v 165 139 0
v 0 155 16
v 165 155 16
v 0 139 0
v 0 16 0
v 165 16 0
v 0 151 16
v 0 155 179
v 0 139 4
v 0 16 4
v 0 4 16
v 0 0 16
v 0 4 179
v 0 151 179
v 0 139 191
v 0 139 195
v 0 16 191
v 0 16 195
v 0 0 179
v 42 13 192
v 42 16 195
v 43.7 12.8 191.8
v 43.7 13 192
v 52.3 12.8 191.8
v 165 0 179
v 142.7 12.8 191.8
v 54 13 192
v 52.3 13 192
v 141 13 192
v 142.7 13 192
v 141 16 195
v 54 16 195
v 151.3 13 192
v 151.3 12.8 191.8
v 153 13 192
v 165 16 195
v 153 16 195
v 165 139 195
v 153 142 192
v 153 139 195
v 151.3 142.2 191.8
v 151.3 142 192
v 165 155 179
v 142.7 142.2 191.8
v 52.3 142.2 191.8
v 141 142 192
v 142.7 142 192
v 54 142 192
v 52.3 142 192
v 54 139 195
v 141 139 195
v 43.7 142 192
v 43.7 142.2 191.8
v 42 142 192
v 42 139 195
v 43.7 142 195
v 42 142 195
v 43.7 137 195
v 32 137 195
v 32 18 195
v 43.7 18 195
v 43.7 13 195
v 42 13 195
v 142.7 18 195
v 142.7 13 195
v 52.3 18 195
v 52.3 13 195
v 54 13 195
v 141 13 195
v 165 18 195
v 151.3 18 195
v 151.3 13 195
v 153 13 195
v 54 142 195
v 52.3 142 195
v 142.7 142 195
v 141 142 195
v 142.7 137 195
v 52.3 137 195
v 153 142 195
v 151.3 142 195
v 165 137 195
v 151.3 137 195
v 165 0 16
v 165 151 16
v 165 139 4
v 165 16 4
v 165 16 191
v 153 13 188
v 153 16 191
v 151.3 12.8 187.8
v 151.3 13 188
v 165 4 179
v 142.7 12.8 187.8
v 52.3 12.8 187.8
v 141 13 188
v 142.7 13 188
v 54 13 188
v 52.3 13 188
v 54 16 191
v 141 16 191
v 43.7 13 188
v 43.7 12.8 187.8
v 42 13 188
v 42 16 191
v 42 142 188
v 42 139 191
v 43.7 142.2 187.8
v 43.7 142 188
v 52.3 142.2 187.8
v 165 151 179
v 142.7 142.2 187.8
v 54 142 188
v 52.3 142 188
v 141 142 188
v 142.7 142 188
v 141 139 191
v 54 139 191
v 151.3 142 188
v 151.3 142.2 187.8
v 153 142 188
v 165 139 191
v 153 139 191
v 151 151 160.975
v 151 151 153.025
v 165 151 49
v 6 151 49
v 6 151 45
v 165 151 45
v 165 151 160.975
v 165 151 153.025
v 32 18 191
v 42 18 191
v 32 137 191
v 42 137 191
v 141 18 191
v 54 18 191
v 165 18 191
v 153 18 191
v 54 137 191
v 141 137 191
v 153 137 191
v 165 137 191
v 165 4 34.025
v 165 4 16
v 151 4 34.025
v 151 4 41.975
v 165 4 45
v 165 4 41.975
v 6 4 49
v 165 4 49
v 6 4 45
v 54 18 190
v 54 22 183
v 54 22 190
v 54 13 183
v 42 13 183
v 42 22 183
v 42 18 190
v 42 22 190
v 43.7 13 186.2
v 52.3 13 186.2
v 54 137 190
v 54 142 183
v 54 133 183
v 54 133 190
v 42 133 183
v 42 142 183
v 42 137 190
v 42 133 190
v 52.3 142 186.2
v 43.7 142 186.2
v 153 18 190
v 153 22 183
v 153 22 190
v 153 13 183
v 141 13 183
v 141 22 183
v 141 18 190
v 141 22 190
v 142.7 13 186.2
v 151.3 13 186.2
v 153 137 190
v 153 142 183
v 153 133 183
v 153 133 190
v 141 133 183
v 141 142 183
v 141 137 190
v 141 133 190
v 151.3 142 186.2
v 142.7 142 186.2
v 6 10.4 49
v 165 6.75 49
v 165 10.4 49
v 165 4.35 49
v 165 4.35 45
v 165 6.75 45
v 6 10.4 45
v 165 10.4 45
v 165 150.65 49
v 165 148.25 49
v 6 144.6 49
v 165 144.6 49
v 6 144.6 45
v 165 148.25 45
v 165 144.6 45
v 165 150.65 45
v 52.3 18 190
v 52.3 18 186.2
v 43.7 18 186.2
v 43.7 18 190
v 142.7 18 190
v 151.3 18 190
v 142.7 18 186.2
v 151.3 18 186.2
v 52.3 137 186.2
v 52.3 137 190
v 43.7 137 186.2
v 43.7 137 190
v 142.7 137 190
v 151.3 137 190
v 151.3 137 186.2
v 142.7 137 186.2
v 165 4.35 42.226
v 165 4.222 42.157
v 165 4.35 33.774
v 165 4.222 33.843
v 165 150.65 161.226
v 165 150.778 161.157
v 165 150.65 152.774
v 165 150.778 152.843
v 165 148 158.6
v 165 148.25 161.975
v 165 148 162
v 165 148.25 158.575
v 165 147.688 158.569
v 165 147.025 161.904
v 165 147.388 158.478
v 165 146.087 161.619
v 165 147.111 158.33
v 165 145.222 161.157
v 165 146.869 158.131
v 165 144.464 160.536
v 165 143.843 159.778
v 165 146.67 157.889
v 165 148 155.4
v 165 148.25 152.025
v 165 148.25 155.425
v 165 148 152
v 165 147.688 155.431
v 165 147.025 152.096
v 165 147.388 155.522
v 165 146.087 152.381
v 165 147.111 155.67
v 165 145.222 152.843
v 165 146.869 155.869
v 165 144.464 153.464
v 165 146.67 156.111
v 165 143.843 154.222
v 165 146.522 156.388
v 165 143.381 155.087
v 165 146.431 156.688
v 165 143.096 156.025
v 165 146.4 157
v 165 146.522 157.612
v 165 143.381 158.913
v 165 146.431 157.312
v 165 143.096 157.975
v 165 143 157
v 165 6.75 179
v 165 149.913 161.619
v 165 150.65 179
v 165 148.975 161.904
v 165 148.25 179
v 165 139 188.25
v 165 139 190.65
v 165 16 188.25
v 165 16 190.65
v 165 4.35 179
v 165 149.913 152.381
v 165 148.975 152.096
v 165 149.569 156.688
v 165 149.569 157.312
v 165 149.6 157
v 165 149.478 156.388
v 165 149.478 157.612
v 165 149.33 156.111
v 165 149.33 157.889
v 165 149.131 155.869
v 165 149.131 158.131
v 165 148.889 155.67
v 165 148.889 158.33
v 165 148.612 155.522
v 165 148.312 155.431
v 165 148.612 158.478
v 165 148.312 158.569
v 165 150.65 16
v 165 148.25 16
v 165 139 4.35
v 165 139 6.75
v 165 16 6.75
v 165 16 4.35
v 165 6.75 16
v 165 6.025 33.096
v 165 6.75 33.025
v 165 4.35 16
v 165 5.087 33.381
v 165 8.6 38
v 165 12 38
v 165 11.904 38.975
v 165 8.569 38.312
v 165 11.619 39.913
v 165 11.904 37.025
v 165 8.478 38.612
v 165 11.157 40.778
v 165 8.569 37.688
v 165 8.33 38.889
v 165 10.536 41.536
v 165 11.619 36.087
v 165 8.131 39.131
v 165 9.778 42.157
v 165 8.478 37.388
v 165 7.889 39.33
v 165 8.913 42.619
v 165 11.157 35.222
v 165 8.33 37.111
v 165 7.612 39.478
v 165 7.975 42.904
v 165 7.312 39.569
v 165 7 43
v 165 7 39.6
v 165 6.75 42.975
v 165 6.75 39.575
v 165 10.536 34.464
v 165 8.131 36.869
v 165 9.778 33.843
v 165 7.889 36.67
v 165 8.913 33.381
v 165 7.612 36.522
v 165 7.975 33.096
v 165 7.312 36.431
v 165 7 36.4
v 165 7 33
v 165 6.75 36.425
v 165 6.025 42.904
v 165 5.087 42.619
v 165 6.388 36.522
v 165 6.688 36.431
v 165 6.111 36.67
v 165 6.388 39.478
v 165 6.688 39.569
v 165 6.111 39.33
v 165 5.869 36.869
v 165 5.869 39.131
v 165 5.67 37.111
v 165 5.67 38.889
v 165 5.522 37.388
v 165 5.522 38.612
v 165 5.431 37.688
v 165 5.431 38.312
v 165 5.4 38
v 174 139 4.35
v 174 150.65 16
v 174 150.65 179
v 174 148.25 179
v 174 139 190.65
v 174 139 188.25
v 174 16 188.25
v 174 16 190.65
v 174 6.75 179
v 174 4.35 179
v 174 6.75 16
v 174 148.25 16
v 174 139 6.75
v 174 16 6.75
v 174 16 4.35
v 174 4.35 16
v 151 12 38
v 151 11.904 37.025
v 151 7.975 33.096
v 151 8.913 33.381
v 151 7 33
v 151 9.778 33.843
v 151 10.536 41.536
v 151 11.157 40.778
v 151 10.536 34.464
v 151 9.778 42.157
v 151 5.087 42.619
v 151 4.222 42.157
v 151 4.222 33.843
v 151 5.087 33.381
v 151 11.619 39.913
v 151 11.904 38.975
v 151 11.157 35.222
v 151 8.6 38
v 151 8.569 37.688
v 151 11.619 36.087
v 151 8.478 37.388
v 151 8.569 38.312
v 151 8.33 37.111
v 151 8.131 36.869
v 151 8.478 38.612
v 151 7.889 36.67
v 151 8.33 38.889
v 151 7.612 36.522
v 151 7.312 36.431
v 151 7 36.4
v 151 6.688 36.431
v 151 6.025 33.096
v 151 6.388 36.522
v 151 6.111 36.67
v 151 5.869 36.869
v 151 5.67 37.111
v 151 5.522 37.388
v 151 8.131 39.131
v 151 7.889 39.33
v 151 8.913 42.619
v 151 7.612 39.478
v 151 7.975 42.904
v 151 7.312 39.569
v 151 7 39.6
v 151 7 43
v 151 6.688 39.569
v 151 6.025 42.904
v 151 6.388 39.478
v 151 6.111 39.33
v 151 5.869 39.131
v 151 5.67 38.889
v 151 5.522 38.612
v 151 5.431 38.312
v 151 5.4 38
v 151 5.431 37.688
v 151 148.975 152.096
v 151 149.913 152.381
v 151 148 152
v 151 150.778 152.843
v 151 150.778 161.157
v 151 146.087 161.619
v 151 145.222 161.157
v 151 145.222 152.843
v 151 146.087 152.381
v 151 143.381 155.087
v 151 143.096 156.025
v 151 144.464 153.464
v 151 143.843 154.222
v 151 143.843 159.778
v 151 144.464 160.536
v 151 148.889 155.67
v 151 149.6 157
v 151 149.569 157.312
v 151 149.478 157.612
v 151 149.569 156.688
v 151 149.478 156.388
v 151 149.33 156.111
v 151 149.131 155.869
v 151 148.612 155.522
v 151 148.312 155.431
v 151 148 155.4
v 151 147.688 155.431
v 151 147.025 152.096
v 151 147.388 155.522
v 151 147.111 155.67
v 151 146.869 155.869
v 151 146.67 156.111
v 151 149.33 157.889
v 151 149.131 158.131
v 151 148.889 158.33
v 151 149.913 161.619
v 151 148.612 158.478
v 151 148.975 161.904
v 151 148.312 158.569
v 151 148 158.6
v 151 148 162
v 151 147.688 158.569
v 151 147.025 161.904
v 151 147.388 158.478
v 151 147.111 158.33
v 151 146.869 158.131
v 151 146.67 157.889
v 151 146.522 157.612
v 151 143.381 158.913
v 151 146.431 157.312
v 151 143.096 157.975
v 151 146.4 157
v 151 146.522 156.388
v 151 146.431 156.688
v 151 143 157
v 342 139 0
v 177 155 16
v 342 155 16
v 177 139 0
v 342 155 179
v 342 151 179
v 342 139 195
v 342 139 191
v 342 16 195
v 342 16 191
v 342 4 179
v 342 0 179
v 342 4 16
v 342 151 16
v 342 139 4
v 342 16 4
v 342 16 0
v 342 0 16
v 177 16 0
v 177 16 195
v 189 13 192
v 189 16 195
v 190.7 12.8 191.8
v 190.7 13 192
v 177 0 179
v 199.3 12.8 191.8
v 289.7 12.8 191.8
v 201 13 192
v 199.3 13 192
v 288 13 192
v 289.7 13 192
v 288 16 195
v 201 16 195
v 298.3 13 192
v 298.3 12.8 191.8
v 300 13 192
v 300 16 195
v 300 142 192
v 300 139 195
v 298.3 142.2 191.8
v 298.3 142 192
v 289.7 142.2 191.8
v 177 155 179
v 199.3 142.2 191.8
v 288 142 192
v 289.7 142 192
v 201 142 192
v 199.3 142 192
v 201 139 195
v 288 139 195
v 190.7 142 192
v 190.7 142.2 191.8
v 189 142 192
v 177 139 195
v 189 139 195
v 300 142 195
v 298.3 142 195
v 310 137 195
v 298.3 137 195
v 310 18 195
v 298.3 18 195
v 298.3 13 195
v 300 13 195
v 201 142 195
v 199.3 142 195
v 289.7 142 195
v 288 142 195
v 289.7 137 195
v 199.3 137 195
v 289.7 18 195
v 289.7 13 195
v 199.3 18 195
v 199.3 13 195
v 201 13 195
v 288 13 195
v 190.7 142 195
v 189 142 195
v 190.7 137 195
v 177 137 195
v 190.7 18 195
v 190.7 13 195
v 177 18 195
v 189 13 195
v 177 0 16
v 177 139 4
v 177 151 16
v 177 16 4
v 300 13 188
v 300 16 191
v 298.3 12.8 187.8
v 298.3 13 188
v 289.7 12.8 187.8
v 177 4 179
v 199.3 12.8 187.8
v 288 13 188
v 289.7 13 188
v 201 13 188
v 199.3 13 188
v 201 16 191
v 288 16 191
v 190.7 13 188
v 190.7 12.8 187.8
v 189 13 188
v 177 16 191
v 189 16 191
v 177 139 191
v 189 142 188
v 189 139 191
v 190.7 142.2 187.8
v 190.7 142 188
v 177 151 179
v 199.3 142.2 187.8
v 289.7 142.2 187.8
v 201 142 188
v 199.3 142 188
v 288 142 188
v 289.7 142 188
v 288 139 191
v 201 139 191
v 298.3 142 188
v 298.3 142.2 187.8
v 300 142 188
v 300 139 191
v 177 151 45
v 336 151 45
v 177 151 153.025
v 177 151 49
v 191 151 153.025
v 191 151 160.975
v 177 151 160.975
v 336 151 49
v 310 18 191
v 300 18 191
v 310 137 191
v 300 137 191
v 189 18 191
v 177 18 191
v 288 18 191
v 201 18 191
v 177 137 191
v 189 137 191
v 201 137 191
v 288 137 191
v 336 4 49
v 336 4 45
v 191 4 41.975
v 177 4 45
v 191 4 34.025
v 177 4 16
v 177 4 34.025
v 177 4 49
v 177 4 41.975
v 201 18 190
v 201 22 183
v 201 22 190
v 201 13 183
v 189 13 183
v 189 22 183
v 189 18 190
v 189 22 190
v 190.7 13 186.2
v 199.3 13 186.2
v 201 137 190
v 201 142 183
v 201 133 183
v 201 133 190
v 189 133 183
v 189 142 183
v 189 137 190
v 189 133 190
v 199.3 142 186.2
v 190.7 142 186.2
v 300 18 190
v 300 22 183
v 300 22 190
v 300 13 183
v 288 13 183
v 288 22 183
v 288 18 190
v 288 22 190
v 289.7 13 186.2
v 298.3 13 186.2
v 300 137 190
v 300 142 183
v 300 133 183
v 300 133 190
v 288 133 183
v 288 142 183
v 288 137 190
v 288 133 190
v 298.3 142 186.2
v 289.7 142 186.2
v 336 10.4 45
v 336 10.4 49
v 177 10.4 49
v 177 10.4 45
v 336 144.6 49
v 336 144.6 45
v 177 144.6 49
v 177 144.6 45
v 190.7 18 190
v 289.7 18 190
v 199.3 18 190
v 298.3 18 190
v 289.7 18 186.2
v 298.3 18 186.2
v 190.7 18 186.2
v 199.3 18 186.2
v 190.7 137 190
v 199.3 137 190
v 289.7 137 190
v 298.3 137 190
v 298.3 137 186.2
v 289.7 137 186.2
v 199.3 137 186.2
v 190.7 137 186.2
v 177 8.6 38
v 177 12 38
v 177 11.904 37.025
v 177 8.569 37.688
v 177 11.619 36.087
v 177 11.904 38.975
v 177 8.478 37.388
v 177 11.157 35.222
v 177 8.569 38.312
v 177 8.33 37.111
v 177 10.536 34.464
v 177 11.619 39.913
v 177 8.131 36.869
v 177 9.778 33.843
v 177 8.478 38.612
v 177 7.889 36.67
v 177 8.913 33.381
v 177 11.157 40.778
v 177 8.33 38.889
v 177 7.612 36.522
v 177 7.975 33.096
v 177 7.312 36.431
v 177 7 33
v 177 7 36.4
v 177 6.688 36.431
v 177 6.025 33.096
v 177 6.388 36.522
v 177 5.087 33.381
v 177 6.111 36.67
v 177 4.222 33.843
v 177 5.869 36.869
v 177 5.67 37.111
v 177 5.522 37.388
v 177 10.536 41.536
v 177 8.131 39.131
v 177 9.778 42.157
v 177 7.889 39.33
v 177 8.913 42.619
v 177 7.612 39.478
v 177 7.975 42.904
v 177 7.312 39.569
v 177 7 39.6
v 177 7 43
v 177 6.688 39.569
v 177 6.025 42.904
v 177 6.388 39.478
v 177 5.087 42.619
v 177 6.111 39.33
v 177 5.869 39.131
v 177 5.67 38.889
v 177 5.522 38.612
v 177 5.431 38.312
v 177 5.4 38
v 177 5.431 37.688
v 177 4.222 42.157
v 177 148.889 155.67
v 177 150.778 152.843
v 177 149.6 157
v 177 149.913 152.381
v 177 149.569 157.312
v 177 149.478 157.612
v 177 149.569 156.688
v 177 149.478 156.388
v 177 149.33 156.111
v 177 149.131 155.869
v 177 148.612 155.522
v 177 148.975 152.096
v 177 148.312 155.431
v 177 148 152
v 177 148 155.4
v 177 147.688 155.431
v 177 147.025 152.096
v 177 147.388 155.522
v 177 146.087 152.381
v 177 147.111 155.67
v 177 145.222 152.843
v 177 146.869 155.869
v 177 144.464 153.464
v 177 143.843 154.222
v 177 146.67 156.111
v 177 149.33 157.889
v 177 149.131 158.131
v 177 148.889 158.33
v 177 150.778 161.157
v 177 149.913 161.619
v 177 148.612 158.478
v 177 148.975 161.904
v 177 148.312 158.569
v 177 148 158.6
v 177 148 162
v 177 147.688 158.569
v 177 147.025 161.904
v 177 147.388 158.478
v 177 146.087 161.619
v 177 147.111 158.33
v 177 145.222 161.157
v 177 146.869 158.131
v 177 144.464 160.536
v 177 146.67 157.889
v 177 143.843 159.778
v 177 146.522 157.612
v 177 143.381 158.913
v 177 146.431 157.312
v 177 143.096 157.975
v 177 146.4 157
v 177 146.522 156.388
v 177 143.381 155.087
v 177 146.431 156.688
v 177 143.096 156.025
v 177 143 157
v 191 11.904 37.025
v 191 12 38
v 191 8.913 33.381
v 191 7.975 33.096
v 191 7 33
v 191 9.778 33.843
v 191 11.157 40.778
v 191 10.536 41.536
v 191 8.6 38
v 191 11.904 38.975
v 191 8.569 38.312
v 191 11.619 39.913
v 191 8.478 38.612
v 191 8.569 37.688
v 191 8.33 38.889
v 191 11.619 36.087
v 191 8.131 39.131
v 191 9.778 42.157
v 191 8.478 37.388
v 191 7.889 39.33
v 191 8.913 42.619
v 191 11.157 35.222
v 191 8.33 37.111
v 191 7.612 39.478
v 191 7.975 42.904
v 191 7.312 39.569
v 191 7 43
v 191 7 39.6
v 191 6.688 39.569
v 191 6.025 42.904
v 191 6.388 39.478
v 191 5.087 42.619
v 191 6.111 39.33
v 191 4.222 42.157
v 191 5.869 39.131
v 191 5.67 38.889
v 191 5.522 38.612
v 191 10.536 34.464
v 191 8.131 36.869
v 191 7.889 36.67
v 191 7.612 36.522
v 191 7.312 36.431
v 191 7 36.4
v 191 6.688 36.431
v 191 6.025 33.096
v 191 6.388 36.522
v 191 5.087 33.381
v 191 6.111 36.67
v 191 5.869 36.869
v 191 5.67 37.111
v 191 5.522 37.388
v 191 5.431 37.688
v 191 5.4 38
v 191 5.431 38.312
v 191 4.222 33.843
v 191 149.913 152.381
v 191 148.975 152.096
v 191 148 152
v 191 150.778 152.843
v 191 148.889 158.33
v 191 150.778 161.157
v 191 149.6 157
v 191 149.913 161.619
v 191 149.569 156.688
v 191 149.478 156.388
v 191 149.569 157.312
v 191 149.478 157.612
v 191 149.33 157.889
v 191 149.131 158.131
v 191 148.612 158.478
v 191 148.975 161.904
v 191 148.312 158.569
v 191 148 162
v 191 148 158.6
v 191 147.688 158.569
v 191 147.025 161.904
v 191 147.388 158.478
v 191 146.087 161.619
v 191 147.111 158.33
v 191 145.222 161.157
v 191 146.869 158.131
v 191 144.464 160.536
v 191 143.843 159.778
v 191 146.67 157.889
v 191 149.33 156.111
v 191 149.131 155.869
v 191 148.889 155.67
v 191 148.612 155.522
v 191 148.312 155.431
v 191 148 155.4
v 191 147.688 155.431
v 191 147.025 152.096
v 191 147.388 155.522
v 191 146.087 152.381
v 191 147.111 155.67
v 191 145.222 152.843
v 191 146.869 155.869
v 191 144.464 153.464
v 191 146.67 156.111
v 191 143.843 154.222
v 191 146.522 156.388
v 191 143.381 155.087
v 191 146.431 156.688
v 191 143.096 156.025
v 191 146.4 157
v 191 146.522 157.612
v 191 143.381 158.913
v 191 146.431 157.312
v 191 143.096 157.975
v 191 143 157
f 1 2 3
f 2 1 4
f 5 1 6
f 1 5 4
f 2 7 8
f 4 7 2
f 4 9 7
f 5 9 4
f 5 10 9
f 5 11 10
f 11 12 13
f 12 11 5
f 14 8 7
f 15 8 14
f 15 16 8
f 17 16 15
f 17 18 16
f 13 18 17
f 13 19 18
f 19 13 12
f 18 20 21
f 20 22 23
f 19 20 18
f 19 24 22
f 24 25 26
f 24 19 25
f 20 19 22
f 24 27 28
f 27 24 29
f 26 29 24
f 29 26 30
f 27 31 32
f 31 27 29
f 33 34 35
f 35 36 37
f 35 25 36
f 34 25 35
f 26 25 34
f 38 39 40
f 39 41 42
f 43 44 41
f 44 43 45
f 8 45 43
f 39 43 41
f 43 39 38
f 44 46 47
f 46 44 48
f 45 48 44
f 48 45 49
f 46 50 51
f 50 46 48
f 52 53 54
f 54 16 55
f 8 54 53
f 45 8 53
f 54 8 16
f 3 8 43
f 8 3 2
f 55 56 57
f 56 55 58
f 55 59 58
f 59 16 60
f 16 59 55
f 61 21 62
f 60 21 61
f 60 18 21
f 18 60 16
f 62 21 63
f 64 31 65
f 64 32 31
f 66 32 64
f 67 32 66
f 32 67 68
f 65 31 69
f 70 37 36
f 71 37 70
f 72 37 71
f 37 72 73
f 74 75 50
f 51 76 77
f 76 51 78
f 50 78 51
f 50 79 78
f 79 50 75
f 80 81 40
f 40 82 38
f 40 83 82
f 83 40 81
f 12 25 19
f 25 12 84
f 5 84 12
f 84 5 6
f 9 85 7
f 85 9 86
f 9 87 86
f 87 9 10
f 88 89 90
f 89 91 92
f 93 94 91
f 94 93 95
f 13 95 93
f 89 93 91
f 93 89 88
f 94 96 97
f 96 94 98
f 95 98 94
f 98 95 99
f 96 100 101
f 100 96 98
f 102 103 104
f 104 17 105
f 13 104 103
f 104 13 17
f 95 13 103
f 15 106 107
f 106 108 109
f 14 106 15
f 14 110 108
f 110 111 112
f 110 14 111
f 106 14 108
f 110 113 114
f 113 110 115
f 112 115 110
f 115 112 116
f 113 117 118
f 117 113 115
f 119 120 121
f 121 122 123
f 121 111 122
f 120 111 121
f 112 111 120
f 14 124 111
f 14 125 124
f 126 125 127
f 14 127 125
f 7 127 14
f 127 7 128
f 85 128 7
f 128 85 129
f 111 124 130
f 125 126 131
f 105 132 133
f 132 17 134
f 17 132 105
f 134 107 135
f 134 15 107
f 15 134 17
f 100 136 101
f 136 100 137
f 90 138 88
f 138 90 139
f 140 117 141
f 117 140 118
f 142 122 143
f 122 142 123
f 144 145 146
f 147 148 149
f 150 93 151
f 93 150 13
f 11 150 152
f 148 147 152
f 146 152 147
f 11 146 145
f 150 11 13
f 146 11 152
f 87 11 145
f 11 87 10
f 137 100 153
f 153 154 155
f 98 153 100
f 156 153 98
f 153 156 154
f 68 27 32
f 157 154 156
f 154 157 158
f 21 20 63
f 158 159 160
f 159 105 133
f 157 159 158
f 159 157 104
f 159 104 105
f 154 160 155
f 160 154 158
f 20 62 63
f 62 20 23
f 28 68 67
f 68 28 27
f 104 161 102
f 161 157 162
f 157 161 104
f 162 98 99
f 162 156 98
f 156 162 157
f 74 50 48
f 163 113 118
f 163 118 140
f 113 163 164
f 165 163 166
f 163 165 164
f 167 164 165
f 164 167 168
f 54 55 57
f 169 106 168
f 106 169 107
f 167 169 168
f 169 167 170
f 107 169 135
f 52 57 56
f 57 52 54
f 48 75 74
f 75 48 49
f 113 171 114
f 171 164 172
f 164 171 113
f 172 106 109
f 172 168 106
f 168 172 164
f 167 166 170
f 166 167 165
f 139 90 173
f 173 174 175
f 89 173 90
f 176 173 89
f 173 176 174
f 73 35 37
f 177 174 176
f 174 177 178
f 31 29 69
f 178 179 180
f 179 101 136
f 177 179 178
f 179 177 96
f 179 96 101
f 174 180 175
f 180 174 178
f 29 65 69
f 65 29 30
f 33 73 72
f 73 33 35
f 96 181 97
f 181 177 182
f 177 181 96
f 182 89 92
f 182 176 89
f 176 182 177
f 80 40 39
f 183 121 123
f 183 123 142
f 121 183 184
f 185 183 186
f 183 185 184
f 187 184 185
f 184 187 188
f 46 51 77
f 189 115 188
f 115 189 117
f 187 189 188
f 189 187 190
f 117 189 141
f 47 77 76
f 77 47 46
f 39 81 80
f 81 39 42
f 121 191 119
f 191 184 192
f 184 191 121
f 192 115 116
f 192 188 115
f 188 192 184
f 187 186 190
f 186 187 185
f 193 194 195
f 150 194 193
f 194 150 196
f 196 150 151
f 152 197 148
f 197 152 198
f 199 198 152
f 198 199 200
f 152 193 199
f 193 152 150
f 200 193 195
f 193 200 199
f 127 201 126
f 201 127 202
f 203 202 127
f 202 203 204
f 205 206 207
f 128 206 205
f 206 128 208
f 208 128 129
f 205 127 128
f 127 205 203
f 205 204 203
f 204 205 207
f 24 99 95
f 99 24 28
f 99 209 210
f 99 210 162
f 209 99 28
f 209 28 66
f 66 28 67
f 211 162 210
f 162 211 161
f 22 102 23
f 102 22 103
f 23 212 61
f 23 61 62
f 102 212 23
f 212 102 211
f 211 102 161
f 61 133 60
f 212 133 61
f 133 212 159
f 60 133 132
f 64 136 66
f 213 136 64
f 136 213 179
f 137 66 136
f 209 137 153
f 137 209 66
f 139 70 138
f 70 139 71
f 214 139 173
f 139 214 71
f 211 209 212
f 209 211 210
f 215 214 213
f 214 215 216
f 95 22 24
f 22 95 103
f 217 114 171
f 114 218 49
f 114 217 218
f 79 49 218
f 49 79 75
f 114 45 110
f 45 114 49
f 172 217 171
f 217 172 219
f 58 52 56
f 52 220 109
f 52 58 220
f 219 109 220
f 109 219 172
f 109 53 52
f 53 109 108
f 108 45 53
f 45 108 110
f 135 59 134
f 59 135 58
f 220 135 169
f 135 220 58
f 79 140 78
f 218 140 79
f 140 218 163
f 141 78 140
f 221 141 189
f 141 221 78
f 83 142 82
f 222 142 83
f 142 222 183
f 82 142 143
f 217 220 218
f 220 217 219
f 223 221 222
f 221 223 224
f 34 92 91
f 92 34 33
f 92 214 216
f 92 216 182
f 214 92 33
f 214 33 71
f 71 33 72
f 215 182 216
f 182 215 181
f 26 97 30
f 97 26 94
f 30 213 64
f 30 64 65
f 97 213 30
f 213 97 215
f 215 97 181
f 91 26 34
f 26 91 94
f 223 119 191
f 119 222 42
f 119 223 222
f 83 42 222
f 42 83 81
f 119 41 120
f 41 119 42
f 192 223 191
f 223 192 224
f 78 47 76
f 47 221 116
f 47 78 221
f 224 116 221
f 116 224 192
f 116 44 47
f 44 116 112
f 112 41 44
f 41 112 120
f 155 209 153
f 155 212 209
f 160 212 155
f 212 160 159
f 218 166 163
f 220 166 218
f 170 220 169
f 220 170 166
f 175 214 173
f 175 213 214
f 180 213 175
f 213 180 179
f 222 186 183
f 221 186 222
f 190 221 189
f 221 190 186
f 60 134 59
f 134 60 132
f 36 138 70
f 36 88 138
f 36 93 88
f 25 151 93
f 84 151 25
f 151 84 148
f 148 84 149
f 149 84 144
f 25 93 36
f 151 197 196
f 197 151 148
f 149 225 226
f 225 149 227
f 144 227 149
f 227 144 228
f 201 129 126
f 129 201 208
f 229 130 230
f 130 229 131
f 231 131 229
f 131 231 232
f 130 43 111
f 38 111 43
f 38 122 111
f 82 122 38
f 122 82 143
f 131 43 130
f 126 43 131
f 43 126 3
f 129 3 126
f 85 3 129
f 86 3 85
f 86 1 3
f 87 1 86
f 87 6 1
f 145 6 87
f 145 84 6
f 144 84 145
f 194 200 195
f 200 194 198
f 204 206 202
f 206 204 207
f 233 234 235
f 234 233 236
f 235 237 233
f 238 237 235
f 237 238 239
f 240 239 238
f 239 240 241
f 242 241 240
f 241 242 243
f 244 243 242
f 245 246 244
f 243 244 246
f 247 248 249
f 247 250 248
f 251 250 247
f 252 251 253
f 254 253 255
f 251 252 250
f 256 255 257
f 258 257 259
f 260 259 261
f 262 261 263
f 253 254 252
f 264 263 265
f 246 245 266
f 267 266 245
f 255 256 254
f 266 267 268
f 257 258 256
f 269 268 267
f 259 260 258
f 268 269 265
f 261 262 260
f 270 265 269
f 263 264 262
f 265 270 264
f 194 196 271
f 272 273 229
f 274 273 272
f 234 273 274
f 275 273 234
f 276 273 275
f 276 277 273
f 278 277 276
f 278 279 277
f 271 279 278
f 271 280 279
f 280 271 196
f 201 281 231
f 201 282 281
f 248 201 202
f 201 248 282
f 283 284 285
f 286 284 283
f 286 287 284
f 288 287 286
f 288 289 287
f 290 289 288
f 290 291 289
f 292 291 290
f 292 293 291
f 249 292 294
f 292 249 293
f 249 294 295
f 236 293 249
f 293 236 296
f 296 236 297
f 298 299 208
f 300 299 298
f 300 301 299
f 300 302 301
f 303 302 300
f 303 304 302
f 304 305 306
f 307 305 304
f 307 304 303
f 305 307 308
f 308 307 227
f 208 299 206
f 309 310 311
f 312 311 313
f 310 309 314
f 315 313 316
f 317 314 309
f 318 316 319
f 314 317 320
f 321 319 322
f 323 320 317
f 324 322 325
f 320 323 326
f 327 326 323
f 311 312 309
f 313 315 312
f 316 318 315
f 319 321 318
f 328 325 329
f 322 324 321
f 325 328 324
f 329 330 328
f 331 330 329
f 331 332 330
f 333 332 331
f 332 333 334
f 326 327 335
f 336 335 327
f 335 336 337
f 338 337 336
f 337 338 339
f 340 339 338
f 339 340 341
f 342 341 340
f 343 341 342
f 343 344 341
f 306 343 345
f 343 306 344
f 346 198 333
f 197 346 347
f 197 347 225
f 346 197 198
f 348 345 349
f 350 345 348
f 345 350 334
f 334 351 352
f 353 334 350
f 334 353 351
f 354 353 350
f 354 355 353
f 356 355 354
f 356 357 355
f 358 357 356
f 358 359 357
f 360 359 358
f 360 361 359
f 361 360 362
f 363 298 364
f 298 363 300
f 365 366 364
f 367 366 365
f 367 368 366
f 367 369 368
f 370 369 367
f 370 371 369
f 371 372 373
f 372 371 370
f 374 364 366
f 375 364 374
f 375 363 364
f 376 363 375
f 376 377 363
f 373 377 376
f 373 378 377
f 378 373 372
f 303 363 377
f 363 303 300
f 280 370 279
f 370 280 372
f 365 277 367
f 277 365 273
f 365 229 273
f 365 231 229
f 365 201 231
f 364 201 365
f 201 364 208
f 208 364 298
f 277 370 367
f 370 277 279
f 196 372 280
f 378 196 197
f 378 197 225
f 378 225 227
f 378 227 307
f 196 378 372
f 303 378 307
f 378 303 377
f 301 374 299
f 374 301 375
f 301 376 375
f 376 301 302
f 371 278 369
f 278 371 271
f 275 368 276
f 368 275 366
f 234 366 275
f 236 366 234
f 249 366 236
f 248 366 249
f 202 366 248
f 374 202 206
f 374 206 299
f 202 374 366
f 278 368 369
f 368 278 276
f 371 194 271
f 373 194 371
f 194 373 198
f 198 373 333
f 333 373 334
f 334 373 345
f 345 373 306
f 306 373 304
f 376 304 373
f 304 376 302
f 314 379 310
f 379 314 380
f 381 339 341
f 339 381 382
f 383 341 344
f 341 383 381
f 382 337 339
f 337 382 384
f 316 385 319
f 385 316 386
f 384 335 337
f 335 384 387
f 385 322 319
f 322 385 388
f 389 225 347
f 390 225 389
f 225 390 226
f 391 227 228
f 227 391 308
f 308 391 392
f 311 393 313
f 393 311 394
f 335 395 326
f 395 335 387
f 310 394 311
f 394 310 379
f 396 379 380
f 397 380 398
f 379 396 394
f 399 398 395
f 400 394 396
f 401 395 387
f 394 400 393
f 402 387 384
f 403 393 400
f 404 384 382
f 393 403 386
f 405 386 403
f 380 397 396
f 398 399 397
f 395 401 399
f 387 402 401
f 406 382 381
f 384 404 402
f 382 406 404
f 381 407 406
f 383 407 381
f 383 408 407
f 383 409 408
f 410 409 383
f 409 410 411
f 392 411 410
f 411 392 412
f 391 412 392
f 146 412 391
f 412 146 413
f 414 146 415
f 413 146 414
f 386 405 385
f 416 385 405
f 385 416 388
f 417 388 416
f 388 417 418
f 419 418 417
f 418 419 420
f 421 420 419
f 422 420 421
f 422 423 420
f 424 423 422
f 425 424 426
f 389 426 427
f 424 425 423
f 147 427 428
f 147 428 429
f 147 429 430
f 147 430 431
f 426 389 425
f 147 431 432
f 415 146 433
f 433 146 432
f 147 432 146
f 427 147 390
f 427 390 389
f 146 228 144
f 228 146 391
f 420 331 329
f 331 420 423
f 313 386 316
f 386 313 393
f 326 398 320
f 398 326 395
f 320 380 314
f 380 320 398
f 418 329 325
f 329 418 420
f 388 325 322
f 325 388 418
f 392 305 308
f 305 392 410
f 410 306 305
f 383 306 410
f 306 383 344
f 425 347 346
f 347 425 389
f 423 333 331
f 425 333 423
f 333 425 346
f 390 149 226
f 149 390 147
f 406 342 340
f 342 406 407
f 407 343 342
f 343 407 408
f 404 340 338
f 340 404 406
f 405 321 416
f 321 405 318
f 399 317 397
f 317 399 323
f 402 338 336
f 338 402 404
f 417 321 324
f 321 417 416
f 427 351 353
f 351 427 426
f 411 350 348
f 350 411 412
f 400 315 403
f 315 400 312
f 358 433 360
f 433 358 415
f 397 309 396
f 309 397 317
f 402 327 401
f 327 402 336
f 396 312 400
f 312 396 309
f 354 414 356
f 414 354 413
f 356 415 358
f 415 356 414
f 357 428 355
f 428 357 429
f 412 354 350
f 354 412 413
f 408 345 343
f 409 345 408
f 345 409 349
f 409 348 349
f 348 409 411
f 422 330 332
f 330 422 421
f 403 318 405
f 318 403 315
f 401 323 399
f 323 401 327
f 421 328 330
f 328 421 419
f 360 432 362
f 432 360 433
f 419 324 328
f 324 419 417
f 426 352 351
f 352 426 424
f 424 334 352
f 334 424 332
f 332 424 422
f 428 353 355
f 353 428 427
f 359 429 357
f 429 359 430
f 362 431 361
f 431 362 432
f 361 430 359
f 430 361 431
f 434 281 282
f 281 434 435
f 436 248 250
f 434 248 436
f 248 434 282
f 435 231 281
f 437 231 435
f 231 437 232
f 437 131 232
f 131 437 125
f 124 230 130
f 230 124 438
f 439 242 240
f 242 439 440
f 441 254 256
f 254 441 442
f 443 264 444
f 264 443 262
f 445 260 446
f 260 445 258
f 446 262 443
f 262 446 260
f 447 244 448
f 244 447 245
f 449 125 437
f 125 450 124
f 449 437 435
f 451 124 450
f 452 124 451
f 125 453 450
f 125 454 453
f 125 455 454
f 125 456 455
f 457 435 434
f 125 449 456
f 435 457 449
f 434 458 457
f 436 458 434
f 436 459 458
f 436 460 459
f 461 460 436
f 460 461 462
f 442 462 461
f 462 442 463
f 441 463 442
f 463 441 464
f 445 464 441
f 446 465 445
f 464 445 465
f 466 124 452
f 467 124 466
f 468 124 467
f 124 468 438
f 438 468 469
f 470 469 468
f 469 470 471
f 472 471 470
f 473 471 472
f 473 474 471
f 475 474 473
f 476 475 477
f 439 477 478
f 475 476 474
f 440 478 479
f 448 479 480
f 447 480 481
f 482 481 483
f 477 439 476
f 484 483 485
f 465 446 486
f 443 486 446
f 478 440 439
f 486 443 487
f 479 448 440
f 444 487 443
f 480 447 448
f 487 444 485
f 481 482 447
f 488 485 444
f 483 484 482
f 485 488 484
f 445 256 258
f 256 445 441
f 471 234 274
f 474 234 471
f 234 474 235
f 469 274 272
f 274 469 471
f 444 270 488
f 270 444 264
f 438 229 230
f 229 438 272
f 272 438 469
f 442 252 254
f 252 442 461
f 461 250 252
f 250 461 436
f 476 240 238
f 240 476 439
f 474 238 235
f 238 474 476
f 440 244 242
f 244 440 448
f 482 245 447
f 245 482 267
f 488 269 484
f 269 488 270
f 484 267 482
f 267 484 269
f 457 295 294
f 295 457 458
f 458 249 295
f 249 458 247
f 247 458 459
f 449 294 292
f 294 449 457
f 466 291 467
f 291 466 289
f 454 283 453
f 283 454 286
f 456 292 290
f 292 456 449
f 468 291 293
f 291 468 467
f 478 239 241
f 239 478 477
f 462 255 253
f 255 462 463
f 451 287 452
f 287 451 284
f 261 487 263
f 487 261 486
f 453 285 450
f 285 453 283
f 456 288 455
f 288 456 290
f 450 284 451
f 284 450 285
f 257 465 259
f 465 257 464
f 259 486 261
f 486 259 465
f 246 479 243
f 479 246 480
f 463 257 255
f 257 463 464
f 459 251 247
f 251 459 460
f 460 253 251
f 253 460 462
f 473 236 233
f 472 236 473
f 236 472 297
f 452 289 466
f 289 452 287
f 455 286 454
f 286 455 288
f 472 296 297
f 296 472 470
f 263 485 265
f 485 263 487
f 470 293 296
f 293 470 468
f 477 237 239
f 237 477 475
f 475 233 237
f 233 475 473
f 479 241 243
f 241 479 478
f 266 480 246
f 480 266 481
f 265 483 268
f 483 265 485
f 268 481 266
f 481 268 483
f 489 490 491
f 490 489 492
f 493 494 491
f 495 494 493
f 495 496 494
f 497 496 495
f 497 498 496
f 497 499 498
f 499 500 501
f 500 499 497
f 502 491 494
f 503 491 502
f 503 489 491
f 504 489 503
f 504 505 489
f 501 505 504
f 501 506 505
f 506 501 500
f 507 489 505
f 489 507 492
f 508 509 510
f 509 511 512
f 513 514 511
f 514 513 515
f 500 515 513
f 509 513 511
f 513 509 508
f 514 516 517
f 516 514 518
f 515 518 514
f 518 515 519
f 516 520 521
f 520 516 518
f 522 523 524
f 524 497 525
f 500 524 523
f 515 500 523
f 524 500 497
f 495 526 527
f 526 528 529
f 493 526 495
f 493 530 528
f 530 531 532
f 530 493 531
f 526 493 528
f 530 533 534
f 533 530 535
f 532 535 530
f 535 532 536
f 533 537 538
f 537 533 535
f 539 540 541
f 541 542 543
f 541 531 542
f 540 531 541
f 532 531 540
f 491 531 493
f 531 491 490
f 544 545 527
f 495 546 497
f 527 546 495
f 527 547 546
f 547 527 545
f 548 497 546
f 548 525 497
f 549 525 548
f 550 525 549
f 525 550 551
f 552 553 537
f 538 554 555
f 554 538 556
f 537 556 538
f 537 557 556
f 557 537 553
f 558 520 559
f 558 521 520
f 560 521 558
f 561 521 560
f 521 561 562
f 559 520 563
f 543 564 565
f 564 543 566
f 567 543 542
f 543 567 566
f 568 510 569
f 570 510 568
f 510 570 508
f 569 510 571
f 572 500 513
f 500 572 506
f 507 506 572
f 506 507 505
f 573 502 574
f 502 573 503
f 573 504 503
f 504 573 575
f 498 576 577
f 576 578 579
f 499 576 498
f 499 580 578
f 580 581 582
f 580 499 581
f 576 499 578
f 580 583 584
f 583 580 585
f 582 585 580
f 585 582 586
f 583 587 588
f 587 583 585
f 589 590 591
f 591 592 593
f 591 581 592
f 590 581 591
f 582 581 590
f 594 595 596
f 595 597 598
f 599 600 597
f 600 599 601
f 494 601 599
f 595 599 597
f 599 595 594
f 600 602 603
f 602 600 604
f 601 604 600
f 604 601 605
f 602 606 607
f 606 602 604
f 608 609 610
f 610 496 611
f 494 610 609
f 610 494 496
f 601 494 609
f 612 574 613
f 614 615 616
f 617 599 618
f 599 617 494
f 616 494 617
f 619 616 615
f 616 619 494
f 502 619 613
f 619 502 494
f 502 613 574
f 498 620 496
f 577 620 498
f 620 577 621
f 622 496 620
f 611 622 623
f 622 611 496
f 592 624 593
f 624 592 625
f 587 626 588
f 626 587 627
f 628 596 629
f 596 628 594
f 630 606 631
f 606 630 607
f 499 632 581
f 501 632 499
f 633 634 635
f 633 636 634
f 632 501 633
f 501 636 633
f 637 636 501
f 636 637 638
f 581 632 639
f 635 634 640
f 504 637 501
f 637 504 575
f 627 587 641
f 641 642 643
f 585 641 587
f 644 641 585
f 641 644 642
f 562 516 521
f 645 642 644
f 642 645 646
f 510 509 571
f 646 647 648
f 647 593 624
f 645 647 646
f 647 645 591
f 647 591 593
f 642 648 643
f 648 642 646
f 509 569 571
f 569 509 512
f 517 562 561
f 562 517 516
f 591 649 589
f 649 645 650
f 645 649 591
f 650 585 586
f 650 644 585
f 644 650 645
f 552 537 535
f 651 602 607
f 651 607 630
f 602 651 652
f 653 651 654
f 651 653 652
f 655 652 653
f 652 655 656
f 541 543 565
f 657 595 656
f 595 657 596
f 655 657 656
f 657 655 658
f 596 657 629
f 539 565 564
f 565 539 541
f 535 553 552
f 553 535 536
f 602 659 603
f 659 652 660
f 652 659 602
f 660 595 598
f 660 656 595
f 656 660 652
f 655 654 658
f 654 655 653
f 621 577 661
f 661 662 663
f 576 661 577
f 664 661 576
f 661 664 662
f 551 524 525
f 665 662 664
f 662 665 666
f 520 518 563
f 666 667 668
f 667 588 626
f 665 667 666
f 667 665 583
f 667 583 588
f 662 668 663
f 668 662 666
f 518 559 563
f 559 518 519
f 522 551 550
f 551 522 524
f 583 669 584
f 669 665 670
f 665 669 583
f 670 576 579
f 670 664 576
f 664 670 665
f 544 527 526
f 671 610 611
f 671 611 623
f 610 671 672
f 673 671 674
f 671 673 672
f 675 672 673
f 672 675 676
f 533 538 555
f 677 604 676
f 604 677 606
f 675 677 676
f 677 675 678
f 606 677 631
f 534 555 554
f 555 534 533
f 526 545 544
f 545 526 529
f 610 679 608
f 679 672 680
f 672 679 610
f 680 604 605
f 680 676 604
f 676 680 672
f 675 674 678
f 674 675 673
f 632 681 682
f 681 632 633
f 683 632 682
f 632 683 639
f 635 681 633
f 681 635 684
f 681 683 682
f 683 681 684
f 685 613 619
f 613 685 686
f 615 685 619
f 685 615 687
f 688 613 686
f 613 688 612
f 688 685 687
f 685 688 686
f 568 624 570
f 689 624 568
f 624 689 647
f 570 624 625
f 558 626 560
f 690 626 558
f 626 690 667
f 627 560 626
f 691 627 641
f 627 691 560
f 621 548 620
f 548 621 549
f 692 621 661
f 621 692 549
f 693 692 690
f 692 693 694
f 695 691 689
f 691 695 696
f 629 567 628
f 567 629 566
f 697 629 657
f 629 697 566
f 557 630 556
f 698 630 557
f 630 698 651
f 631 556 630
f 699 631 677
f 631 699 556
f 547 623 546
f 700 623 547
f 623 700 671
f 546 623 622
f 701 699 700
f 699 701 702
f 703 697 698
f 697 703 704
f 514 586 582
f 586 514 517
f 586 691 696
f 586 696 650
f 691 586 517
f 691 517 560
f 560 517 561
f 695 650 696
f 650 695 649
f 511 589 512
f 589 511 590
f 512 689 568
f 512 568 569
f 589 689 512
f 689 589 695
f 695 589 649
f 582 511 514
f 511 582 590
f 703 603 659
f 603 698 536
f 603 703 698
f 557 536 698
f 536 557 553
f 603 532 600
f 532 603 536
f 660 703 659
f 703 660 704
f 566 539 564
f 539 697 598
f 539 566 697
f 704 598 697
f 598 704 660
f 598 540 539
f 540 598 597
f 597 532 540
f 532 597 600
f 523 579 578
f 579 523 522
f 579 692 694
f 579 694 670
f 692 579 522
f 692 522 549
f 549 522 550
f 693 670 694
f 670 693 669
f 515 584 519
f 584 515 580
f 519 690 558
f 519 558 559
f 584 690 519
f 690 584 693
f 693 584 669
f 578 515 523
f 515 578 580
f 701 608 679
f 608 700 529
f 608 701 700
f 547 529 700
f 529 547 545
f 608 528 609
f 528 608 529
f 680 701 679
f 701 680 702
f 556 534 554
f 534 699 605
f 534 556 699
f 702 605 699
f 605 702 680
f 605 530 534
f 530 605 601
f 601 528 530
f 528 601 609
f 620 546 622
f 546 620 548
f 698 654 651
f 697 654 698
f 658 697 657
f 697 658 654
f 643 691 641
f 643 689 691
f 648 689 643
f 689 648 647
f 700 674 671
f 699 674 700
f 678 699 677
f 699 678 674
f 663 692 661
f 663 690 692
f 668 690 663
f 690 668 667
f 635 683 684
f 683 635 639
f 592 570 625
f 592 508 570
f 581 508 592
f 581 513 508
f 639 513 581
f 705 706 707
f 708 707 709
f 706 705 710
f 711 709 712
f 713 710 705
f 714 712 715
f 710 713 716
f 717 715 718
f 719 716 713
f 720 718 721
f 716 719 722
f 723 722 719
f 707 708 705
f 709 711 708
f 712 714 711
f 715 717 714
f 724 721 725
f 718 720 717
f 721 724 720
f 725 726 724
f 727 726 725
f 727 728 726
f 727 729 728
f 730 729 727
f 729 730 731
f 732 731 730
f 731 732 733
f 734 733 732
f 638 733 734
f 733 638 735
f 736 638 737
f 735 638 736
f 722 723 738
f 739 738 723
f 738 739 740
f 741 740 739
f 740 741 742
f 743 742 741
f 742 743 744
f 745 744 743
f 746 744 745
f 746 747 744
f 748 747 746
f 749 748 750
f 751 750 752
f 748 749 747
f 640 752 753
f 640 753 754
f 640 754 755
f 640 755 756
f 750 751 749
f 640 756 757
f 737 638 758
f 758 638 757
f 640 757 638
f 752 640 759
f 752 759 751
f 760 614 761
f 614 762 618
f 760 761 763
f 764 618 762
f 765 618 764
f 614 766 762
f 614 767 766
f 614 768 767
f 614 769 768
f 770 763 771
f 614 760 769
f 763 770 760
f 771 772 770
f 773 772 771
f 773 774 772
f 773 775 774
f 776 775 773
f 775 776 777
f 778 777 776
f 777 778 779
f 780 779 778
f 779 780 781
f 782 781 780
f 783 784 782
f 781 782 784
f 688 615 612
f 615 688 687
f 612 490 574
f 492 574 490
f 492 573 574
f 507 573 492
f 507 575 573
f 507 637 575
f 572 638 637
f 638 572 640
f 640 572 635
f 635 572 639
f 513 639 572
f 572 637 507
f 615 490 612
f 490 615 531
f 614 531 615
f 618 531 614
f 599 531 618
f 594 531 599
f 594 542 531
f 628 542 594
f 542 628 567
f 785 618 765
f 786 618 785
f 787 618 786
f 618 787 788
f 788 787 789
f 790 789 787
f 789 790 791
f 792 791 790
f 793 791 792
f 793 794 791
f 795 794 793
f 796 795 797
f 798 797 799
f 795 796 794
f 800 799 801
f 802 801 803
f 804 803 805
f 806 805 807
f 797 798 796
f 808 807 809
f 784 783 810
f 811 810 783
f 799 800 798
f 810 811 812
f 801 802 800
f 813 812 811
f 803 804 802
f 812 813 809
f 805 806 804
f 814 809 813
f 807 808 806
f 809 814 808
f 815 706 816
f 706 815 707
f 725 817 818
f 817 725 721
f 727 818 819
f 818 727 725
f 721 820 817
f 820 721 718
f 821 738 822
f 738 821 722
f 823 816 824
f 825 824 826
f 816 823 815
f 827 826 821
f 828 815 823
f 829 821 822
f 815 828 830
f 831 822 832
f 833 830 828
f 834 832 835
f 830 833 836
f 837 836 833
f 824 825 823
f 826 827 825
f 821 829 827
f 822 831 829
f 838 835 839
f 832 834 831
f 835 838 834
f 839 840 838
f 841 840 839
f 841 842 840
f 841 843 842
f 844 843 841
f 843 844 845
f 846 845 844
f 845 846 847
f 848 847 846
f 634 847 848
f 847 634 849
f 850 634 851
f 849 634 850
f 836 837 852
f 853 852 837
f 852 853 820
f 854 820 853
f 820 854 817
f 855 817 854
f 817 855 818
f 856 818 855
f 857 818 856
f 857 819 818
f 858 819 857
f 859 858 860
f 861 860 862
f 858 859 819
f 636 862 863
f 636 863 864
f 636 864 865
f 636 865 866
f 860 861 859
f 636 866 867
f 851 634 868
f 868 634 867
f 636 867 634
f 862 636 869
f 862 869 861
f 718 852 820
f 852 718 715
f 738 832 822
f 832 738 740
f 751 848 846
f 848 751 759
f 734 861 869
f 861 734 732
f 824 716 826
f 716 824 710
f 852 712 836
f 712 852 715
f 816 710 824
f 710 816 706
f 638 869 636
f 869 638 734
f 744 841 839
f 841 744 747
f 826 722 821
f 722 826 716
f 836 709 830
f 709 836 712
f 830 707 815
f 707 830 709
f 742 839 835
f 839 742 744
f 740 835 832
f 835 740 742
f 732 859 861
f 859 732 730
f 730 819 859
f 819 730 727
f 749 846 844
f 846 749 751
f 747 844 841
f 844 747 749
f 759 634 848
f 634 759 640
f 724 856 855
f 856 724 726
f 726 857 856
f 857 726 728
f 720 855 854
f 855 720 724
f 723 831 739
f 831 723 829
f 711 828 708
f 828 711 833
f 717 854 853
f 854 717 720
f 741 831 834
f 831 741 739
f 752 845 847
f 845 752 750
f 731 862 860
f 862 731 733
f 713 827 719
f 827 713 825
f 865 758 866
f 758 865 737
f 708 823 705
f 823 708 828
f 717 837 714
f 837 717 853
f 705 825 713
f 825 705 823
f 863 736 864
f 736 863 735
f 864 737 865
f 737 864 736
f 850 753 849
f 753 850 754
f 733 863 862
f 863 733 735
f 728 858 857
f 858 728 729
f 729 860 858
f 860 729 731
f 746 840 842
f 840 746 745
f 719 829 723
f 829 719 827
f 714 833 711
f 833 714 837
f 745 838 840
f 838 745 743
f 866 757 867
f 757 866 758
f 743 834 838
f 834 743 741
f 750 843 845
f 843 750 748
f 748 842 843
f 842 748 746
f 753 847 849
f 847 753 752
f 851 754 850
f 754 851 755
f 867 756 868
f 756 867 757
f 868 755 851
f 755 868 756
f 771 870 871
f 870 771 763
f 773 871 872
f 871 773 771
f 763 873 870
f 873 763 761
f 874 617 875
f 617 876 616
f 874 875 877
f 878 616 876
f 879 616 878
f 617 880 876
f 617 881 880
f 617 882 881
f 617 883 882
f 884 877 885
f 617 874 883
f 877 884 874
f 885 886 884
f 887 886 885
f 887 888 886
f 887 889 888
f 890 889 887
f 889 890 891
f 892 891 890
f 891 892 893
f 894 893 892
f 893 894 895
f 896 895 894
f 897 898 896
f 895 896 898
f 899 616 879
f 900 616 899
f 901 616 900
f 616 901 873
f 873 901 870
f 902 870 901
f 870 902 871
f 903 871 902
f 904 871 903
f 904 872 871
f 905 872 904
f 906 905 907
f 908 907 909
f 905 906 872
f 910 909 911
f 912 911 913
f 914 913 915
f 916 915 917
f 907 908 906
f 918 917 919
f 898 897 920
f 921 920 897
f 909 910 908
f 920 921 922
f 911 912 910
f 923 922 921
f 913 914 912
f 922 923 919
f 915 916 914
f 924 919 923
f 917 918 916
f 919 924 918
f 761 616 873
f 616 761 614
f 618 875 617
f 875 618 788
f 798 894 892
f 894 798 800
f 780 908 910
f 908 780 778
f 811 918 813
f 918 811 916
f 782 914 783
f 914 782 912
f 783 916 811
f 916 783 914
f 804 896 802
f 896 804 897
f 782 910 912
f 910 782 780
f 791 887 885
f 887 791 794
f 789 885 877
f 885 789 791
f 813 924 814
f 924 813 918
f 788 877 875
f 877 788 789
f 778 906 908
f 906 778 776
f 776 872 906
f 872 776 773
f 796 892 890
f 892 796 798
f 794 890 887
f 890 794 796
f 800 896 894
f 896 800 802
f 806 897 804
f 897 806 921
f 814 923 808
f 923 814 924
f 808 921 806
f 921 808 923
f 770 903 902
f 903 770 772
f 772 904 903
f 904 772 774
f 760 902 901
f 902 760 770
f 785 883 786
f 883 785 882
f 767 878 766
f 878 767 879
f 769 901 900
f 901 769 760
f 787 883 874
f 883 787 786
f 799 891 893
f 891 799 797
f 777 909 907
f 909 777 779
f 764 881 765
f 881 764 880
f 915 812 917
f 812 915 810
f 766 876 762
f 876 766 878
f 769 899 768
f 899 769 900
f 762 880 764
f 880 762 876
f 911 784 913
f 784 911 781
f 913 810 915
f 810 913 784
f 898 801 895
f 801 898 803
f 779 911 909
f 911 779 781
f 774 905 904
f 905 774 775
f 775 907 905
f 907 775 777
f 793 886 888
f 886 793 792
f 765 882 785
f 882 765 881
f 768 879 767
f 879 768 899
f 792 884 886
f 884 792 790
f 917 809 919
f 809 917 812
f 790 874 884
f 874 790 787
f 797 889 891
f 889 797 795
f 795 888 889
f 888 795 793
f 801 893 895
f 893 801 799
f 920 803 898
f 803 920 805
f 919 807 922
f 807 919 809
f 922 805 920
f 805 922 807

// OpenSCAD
// file: lib/snap-interface.scad
// Hidden panel snap interface v0.1.
// Print and test the coupon before committing full panels to a printer.

snap_arm_width = 8;
snap_arm_thickness = 2.2;
snap_arm_drop = 8;
snap_barb_depth = 1.0;
snap_barb_height = 2.0;
snap_slot_clearance = 0.30;

module snap_hook() {
    // Panel underside is Z=0; hook extends downward.
    union() {
        translate([-snap_arm_width / 2, 0, -snap_arm_drop])
            cube([snap_arm_width, snap_arm_thickness, snap_arm_drop + 0.4]);
        hull() {
            translate([-snap_arm_width / 2, snap_arm_thickness, -snap_arm_drop])
                cube([snap_arm_width, 0.2, snap_barb_height]);
            translate([-snap_arm_width / 2, snap_arm_thickness + snap_barb_depth, -snap_arm_drop + snap_barb_height])
                cube([snap_arm_width, 0.2, 0.2]);
        }
    }
}

module snap_receiver_slot(depth = 8) {
    translate([
        -snap_arm_width / 2 - snap_slot_clearance,
        -0.1,
        -snap_arm_drop - snap_slot_clearance
    ])
        cube([
            snap_arm_width + 2 * snap_slot_clearance,
            depth + 0.2,
            snap_arm_drop + 2 * snap_slot_clearance
        ]);
}
// main file
// Split structural tunnel v0.1.
// Two printable shell sections with an internal alignment collar.
// External styling follows exterior-nyacom-v0.2.scad.
include <lib/snap-interface.scad>

$fn = 32;

part = "assembly"; // front | rear | assembly

body = [330, 155, 195];
chamfer = 16;
wall = 4;
split_x = 165;
collar_length = 9;
collar_clearance = 0.35; // per side; tune with material coupon
collar_wall = 2.4;
assembly_gap = 12;

intake_opening = [266, 119];
intake_origin = [32, 18];
panel_origin = [30, 12];
panel_half_length = 135;
receiver_x_local = [18, panel_half_length - 18];
receiver_y = [panel_origin[1] + 4, panel_origin[1] + 131 - 4];
receiver_block = [12, 9, 12];
tray_ledge_z = 45;
tray_ledge = [body[0] - 12, 7, 4];

module oct_prism_x(length, width, height, cut) {
    translate([0, 0, height])
        rotate([0, 90, 0])
            linear_extrude(height = length)
                polygon([
                    [cut, 0], [height - cut, 0], [height, cut],
                    [height, width - cut], [height - cut, width],
                    [cut, width], [0, width - cut], [0, cut]
                ]);
}

module full_open_shell() {
    difference() {
        oct_prism_x(body[0], body[1], body[2], chamfer);
        translate([-1, wall, wall])
            oct_prism_x(body[0] + 2, body[1] - 2 * wall, body[2] - 2 * wall, chamfer - wall);
    }
}

module receiver_blocks() {
    for (half_x = [panel_origin[0], panel_origin[0] + panel_half_length],
         local_x = receiver_x_local,
         y = receiver_y)
        translate([
            half_x + local_x - receiver_block[0] / 2,
            y < body[1] / 2 ? 13 : body[1] - 13 - receiver_block[1],
            body[2] - receiver_block[2]
        ]) cube(receiver_block);
}

module tray_ledges() {
    // Continuous ledges carry the tray; screw locations can be drilled into
    // elongated tray slots after the physical fit check.
    translate([6, 3.4, tray_ledge_z]) cube(tray_ledge);
    translate([6, body[1] - 3.4 - tray_ledge[1], tray_ledge_z]) cube(tray_ledge);
}

module snap_receiver_cutouts() {
    for (half_x = [panel_origin[0], panel_origin[0] + panel_half_length],
         local_x = receiver_x_local,
         y = receiver_y)
        translate([
            half_x + local_x - snap_arm_width / 2 - snap_slot_clearance,
            y < body[1] / 2 ? 12.8 : body[1] - 12.8 - 5.2,
            body[2] - snap_arm_drop - snap_slot_clearance - 0.5
        ]) cube([
            snap_arm_width + 2 * snap_slot_clearance,
            5.2,
            snap_arm_drop + snap_slot_clearance + 1
        ]);
}

module functional_shell() {
    difference() {
        union() {
            full_open_shell();
            receiver_blocks();
            tray_ledges();
        }

        // Large dual-fan intake. The split panels overlap this opening.
        translate([intake_origin[0], intake_origin[1], body[2] - wall - 1])
            cube([intake_opening[0], intake_opening[1], wall + 2]);

        snap_receiver_cutouts();
    }
}

module shell_slice(x0, length) {
    intersection() {
        functional_shell();
        translate([x0, -1, -1]) cube([length, body[1] + 2, body[2] + 2]);
    }
}

module male_alignment_collar() {
    outer_inset = wall + collar_clearance;
    translate([split_x, outer_inset, outer_inset])
    difference() {
        oct_prism_x(
            collar_length,
            body[1] - 2 * outer_inset,
            body[2] - 2 * outer_inset,
            chamfer - outer_inset
        );
        translate([-0.5, collar_wall, collar_wall])
            oct_prism_x(
                collar_length + 1,
                body[1] - 2 * outer_inset - 2 * collar_wall,
                body[2] - 2 * outer_inset - 2 * collar_wall,
                chamfer - outer_inset - collar_wall
            );
    }
}

module joint_boss_x(xpos, length, ypos, zpos) {
    // Internal M3 boss. The screw axis crosses the chassis split along X.
    translate([xpos, ypos, zpos])
        rotate([0, 90, 0])
            difference() {
                cylinder(h = length, d = 10);
                translate([0, 0, -0.1]) cylinder(h = length + 0.2, d = 3.2);
            }
}

module front_section() {
    union() {
        shell_slice(0, split_x);
        male_alignment_collar();
        joint_boss_x(split_x - 14, 14, wall + 3, 38);
        joint_boss_x(split_x - 14, 14, body[1] - wall - 3, body[2] - 38);
    }
}

module rear_section() {
    union() {
        shell_slice(split_x, body[0] - split_x);
        joint_boss_x(split_x, 14, wall + 3, 38);
        joint_boss_x(split_x, 14, body[1] - wall - 3, body[2] - 38);
    }
}

if (part == "front")
    front_section();
else if (part == "rear")
    translate([-split_x, 0, 0]) rear_section();
else {
    color([0.10, 0.11, 0.13]) front_section();
    color([0.17, 0.18, 0.20]) translate([assembly_gap, 0, 0]) rear_section();
}

echo("part", part);
echo("front_print_bounds_nominal_mm", [split_x + collar_length, body[1], body[2]]);
echo("rear_print_bounds_nominal_mm", [body[0] - split_x, body[1], body[2]]);
echo("collar_clearance_per_side_mm", collar_clearance);
echo("intake_opening_mm", intake_opening);
echo("snap_receiver_count", 8);
echo("tray_ledge_top_z_mm", tray_ledge_z + tray_ledge[2]);
assert(split_x + collar_length <= 250, "Front section exceeds preliminary 250 mm print-bed limit");
assert(body[0] - split_x <= 250, "Rear section exceeds preliminary 250 mm print-bed limit");
